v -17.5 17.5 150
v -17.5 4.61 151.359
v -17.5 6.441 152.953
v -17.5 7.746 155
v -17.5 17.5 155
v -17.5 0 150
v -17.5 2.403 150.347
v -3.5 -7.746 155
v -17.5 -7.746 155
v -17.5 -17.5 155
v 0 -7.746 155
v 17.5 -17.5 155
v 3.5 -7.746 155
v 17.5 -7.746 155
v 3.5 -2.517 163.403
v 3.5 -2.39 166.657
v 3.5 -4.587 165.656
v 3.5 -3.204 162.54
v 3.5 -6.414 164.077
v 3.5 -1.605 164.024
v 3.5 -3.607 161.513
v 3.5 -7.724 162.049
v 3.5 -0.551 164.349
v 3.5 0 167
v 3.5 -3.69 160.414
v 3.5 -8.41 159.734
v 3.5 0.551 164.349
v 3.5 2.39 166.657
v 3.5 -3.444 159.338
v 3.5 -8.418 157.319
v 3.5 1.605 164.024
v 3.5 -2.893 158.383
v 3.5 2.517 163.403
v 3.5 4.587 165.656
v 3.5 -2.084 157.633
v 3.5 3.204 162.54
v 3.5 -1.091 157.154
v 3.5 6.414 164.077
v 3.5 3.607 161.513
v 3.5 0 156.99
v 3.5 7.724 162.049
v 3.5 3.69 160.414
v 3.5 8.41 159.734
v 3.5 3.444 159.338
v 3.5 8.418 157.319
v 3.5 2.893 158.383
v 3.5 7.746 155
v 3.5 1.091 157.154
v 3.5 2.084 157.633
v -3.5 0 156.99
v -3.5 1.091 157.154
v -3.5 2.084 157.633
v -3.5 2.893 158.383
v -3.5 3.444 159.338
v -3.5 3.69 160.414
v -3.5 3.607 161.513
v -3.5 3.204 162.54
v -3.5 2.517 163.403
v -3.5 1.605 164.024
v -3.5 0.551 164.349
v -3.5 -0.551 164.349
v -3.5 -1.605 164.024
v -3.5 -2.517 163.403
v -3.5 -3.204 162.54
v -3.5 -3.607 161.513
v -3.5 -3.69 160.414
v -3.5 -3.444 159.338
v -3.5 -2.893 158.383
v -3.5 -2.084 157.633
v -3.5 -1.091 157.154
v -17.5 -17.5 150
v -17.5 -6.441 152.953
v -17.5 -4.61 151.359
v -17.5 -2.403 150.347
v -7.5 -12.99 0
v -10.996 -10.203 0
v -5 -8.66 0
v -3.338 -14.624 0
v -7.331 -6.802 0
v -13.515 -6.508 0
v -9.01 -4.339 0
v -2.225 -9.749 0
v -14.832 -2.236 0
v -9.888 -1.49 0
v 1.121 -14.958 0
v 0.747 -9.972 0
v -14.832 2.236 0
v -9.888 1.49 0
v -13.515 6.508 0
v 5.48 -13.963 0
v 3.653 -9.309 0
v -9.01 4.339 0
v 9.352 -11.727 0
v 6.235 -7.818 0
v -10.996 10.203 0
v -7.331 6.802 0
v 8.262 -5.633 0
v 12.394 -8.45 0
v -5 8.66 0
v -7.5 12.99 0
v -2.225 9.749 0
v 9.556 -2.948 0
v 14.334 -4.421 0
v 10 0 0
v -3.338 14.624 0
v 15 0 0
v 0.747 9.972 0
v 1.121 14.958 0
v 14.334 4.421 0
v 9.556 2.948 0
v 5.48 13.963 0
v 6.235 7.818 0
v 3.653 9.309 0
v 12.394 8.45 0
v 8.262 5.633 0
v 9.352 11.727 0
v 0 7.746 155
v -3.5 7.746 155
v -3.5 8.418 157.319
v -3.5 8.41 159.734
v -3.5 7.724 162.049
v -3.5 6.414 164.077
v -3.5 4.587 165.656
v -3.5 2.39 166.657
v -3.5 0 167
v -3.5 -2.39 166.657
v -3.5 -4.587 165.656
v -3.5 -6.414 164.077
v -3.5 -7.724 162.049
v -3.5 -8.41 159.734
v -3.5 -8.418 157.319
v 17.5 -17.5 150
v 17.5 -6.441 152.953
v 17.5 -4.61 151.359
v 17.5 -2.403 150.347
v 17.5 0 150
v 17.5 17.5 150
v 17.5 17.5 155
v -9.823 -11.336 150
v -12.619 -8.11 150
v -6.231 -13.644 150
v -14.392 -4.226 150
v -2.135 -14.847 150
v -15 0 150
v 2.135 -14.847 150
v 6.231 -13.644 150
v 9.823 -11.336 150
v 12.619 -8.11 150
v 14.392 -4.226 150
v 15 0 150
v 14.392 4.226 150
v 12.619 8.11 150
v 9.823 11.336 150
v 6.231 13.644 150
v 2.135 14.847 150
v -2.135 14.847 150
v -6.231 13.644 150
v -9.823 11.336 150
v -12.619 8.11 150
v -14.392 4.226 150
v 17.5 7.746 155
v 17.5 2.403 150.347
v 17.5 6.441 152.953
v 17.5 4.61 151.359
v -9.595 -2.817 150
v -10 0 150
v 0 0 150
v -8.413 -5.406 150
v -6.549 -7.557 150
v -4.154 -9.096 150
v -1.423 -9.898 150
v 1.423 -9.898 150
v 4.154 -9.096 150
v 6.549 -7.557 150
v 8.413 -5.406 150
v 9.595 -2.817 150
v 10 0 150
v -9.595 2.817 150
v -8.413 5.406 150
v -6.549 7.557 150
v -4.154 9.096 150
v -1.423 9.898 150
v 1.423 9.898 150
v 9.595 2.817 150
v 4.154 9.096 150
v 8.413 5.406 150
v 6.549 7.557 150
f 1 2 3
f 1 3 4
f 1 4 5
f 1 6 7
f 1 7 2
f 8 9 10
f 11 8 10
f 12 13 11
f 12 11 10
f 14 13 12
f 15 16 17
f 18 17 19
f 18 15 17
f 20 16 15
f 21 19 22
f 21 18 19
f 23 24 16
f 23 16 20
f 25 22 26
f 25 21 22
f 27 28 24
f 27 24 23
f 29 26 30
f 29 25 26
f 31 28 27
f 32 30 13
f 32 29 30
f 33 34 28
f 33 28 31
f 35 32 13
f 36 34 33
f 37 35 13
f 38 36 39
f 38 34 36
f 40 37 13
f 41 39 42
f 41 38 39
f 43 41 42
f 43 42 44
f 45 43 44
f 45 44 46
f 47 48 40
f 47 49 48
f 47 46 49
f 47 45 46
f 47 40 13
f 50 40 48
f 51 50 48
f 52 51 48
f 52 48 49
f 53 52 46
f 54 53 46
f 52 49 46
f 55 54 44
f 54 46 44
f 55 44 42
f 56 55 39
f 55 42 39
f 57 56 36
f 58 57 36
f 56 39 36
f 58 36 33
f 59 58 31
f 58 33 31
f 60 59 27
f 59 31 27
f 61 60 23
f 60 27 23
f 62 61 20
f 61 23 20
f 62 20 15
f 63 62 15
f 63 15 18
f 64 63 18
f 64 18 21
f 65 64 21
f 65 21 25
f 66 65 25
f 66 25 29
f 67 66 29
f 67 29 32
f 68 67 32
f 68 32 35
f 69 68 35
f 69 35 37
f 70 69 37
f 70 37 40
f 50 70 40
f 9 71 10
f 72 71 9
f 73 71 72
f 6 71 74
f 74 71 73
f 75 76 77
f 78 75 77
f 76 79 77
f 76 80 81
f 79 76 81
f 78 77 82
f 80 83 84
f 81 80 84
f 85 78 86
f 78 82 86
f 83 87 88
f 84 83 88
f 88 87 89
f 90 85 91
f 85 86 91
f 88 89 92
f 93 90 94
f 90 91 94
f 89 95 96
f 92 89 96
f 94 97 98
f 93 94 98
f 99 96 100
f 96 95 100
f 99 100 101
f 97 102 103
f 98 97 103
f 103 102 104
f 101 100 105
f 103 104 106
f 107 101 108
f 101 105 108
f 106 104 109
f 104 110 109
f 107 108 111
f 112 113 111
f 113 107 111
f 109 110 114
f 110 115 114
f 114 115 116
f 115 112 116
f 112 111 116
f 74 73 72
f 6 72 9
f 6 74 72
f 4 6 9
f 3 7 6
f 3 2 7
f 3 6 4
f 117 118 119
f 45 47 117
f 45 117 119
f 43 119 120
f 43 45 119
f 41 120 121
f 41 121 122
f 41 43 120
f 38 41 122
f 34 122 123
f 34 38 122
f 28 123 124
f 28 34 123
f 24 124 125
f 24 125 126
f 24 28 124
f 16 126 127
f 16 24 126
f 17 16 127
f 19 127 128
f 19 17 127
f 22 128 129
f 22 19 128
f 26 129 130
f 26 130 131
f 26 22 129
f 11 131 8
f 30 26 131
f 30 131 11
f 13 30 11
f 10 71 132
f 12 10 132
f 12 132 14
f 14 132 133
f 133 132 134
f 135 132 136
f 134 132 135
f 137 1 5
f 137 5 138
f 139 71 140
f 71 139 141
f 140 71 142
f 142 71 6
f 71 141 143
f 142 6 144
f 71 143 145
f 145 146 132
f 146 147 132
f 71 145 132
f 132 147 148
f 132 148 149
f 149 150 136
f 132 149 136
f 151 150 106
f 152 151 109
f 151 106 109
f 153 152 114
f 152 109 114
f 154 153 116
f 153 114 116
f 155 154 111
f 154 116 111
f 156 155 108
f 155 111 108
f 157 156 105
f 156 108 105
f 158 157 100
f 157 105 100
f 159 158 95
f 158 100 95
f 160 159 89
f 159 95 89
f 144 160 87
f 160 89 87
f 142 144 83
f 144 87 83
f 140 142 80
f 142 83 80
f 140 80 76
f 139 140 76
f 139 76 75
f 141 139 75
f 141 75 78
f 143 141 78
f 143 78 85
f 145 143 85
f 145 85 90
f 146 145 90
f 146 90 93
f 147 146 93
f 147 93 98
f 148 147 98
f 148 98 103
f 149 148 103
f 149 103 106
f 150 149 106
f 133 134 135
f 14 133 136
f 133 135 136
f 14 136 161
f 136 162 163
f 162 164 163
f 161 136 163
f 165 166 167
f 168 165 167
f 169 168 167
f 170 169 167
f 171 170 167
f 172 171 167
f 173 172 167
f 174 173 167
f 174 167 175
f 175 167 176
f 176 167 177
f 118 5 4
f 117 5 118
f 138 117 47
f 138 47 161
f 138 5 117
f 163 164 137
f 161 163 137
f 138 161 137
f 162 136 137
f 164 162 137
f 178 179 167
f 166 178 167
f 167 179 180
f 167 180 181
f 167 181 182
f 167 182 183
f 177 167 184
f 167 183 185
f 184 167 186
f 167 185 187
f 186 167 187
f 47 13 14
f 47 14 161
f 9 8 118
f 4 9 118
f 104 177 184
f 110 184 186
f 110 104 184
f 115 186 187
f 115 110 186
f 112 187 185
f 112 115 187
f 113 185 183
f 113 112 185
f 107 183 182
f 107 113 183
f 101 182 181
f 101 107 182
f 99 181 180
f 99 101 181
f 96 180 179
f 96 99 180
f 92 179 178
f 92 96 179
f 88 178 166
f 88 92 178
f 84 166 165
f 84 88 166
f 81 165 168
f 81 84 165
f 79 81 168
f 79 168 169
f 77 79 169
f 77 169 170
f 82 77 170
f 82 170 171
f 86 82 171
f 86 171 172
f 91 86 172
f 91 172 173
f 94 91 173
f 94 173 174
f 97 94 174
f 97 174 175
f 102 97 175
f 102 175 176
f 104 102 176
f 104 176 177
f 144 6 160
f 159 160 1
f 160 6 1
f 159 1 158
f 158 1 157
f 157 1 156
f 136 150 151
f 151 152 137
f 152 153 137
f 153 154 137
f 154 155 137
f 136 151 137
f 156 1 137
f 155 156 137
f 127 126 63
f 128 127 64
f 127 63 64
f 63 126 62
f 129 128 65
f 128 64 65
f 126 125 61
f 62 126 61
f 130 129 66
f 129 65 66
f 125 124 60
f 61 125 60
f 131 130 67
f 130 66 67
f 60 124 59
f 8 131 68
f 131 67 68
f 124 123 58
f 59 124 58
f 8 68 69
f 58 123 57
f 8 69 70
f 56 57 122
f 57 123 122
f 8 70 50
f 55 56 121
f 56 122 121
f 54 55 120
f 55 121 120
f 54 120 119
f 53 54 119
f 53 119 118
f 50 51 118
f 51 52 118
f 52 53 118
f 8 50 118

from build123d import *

# Parameters (mm, degrees)
SKETCH1_R           = 15
SKETCH1_R_2         = 10
BOSS_EXTRUDE1_DEPTH = 150
SKETCH2_W           = 35
SKETCH2_H           = 35
BOSS_EXTRUDE2_DEPTH = 5
BOSS_EXTRUDE3_DEPTH = 17.5
CUT_EXTRUDE2_REACH  = 171.222
CUT_EXTRUDE3_REACH  = 171.222
SKETCH8_R           = 3.700210901
CUT_EXTRUDE4_DEPTH  = 170.222486685


with BuildPart() as part:
    # Sketch1 → Boss-Extrude1 (new body)
    with BuildSketch(Plane.XY):
        Circle(SKETCH1_R)
        Circle(SKETCH1_R_2, mode=Mode.SUBTRACT)
    extrude(amount=BOSS_EXTRUDE1_DEPTH)

    # Sketch2 → Boss-Extrude2 (add)
    with BuildSketch(Plane.XY.offset(150)):
        Rectangle(SKETCH2_W, SKETCH2_H)
    extrude(amount=BOSS_EXTRUDE2_DEPTH)

    # Sketch3 → Boss-Extrude3 (add, symmetric)
    with BuildSketch(Plane(origin=(0, 0, 0), x_dir=(0, 0, -1), z_dir=(1, 0, 0))):
        with BuildLine():
            ThreePointArc((-155, 7.745966692), (-167, 0), (-155, -7.745966692))
            Line((-155, -7.745966692), (-155, 7.745966692))
        make_face()
        with BuildLine():
            Line((-155, 7.745966692), (-155, -7.745966692))
            ThreePointArc((-155, -7.745966692), (-151.358571571, -4.609772229), (-150, 0))
            ThreePointArc((-150, 0), (-151.358571571, 4.609772229), (-155, 7.745966692))
        make_face()
    extrude(amount=BOSS_EXTRUDE3_DEPTH, both=True)

    # Sketch5 → Cut-Extrude2 (cut, up to next)
    with BuildSketch(Plane(origin=(3.5, 0, 0), x_dir=(0, 0, -1), z_dir=(1, 0, 0)), mode=Mode.PRIVATE) as cut_extrude2_sk1:
        with BuildLine():
            Line((-155, -7.745966692), (-155, 7.745966692))
            ThreePointArc((-155, 7.745966692), (-167, 0), (-155, -7.745966692))
        make_face()
    cut_extrude2_tool1 = extrude(cut_extrude2_sk1.sketch, amount=CUT_EXTRUDE2_REACH, mode=Mode.PRIVATE) & part.part
    add(cut_extrude2_tool1.solids().sort_by_distance((3.5, 0, 160.309139))[0], mode=Mode.SUBTRACT)

    # Sketch6 → Cut-Extrude3 (cut, up to next)
    with BuildSketch(Plane(origin=(-3.5, 0, 0), x_dir=(0, 0, -1), z_dir=(1, 0, 0)), mode=Mode.PRIVATE) as cut_extrude3_sk1:
        with BuildLine():
            Line((-155, -7.745966692), (-155, 7.745966692))
            ThreePointArc((-155, 7.745966692), (-167, 0), (-155, -7.745966692))
        make_face()
    cut_extrude3_tool1 = extrude(cut_extrude3_sk1.sketch, amount=-CUT_EXTRUDE3_REACH, mode=Mode.PRIVATE) & part.part
    add(cut_extrude3_tool1.solids().sort_by_distance((-3.5, 0, 160.309139))[0], mode=Mode.SUBTRACT)

    # Sketch8 → Cut-Extrude4 (cut, through all)
    with BuildSketch(Plane(origin=(3.5, 0, 0), x_dir=(0, 0, -1), z_dir=(1, 0, 0))):
        with Locations((-160.690072365, 0)):
            Circle(SKETCH8_R)
    extrude(amount=-CUT_EXTRUDE4_DEPTH, mode=Mode.SUBTRACT)


solid = part.part
